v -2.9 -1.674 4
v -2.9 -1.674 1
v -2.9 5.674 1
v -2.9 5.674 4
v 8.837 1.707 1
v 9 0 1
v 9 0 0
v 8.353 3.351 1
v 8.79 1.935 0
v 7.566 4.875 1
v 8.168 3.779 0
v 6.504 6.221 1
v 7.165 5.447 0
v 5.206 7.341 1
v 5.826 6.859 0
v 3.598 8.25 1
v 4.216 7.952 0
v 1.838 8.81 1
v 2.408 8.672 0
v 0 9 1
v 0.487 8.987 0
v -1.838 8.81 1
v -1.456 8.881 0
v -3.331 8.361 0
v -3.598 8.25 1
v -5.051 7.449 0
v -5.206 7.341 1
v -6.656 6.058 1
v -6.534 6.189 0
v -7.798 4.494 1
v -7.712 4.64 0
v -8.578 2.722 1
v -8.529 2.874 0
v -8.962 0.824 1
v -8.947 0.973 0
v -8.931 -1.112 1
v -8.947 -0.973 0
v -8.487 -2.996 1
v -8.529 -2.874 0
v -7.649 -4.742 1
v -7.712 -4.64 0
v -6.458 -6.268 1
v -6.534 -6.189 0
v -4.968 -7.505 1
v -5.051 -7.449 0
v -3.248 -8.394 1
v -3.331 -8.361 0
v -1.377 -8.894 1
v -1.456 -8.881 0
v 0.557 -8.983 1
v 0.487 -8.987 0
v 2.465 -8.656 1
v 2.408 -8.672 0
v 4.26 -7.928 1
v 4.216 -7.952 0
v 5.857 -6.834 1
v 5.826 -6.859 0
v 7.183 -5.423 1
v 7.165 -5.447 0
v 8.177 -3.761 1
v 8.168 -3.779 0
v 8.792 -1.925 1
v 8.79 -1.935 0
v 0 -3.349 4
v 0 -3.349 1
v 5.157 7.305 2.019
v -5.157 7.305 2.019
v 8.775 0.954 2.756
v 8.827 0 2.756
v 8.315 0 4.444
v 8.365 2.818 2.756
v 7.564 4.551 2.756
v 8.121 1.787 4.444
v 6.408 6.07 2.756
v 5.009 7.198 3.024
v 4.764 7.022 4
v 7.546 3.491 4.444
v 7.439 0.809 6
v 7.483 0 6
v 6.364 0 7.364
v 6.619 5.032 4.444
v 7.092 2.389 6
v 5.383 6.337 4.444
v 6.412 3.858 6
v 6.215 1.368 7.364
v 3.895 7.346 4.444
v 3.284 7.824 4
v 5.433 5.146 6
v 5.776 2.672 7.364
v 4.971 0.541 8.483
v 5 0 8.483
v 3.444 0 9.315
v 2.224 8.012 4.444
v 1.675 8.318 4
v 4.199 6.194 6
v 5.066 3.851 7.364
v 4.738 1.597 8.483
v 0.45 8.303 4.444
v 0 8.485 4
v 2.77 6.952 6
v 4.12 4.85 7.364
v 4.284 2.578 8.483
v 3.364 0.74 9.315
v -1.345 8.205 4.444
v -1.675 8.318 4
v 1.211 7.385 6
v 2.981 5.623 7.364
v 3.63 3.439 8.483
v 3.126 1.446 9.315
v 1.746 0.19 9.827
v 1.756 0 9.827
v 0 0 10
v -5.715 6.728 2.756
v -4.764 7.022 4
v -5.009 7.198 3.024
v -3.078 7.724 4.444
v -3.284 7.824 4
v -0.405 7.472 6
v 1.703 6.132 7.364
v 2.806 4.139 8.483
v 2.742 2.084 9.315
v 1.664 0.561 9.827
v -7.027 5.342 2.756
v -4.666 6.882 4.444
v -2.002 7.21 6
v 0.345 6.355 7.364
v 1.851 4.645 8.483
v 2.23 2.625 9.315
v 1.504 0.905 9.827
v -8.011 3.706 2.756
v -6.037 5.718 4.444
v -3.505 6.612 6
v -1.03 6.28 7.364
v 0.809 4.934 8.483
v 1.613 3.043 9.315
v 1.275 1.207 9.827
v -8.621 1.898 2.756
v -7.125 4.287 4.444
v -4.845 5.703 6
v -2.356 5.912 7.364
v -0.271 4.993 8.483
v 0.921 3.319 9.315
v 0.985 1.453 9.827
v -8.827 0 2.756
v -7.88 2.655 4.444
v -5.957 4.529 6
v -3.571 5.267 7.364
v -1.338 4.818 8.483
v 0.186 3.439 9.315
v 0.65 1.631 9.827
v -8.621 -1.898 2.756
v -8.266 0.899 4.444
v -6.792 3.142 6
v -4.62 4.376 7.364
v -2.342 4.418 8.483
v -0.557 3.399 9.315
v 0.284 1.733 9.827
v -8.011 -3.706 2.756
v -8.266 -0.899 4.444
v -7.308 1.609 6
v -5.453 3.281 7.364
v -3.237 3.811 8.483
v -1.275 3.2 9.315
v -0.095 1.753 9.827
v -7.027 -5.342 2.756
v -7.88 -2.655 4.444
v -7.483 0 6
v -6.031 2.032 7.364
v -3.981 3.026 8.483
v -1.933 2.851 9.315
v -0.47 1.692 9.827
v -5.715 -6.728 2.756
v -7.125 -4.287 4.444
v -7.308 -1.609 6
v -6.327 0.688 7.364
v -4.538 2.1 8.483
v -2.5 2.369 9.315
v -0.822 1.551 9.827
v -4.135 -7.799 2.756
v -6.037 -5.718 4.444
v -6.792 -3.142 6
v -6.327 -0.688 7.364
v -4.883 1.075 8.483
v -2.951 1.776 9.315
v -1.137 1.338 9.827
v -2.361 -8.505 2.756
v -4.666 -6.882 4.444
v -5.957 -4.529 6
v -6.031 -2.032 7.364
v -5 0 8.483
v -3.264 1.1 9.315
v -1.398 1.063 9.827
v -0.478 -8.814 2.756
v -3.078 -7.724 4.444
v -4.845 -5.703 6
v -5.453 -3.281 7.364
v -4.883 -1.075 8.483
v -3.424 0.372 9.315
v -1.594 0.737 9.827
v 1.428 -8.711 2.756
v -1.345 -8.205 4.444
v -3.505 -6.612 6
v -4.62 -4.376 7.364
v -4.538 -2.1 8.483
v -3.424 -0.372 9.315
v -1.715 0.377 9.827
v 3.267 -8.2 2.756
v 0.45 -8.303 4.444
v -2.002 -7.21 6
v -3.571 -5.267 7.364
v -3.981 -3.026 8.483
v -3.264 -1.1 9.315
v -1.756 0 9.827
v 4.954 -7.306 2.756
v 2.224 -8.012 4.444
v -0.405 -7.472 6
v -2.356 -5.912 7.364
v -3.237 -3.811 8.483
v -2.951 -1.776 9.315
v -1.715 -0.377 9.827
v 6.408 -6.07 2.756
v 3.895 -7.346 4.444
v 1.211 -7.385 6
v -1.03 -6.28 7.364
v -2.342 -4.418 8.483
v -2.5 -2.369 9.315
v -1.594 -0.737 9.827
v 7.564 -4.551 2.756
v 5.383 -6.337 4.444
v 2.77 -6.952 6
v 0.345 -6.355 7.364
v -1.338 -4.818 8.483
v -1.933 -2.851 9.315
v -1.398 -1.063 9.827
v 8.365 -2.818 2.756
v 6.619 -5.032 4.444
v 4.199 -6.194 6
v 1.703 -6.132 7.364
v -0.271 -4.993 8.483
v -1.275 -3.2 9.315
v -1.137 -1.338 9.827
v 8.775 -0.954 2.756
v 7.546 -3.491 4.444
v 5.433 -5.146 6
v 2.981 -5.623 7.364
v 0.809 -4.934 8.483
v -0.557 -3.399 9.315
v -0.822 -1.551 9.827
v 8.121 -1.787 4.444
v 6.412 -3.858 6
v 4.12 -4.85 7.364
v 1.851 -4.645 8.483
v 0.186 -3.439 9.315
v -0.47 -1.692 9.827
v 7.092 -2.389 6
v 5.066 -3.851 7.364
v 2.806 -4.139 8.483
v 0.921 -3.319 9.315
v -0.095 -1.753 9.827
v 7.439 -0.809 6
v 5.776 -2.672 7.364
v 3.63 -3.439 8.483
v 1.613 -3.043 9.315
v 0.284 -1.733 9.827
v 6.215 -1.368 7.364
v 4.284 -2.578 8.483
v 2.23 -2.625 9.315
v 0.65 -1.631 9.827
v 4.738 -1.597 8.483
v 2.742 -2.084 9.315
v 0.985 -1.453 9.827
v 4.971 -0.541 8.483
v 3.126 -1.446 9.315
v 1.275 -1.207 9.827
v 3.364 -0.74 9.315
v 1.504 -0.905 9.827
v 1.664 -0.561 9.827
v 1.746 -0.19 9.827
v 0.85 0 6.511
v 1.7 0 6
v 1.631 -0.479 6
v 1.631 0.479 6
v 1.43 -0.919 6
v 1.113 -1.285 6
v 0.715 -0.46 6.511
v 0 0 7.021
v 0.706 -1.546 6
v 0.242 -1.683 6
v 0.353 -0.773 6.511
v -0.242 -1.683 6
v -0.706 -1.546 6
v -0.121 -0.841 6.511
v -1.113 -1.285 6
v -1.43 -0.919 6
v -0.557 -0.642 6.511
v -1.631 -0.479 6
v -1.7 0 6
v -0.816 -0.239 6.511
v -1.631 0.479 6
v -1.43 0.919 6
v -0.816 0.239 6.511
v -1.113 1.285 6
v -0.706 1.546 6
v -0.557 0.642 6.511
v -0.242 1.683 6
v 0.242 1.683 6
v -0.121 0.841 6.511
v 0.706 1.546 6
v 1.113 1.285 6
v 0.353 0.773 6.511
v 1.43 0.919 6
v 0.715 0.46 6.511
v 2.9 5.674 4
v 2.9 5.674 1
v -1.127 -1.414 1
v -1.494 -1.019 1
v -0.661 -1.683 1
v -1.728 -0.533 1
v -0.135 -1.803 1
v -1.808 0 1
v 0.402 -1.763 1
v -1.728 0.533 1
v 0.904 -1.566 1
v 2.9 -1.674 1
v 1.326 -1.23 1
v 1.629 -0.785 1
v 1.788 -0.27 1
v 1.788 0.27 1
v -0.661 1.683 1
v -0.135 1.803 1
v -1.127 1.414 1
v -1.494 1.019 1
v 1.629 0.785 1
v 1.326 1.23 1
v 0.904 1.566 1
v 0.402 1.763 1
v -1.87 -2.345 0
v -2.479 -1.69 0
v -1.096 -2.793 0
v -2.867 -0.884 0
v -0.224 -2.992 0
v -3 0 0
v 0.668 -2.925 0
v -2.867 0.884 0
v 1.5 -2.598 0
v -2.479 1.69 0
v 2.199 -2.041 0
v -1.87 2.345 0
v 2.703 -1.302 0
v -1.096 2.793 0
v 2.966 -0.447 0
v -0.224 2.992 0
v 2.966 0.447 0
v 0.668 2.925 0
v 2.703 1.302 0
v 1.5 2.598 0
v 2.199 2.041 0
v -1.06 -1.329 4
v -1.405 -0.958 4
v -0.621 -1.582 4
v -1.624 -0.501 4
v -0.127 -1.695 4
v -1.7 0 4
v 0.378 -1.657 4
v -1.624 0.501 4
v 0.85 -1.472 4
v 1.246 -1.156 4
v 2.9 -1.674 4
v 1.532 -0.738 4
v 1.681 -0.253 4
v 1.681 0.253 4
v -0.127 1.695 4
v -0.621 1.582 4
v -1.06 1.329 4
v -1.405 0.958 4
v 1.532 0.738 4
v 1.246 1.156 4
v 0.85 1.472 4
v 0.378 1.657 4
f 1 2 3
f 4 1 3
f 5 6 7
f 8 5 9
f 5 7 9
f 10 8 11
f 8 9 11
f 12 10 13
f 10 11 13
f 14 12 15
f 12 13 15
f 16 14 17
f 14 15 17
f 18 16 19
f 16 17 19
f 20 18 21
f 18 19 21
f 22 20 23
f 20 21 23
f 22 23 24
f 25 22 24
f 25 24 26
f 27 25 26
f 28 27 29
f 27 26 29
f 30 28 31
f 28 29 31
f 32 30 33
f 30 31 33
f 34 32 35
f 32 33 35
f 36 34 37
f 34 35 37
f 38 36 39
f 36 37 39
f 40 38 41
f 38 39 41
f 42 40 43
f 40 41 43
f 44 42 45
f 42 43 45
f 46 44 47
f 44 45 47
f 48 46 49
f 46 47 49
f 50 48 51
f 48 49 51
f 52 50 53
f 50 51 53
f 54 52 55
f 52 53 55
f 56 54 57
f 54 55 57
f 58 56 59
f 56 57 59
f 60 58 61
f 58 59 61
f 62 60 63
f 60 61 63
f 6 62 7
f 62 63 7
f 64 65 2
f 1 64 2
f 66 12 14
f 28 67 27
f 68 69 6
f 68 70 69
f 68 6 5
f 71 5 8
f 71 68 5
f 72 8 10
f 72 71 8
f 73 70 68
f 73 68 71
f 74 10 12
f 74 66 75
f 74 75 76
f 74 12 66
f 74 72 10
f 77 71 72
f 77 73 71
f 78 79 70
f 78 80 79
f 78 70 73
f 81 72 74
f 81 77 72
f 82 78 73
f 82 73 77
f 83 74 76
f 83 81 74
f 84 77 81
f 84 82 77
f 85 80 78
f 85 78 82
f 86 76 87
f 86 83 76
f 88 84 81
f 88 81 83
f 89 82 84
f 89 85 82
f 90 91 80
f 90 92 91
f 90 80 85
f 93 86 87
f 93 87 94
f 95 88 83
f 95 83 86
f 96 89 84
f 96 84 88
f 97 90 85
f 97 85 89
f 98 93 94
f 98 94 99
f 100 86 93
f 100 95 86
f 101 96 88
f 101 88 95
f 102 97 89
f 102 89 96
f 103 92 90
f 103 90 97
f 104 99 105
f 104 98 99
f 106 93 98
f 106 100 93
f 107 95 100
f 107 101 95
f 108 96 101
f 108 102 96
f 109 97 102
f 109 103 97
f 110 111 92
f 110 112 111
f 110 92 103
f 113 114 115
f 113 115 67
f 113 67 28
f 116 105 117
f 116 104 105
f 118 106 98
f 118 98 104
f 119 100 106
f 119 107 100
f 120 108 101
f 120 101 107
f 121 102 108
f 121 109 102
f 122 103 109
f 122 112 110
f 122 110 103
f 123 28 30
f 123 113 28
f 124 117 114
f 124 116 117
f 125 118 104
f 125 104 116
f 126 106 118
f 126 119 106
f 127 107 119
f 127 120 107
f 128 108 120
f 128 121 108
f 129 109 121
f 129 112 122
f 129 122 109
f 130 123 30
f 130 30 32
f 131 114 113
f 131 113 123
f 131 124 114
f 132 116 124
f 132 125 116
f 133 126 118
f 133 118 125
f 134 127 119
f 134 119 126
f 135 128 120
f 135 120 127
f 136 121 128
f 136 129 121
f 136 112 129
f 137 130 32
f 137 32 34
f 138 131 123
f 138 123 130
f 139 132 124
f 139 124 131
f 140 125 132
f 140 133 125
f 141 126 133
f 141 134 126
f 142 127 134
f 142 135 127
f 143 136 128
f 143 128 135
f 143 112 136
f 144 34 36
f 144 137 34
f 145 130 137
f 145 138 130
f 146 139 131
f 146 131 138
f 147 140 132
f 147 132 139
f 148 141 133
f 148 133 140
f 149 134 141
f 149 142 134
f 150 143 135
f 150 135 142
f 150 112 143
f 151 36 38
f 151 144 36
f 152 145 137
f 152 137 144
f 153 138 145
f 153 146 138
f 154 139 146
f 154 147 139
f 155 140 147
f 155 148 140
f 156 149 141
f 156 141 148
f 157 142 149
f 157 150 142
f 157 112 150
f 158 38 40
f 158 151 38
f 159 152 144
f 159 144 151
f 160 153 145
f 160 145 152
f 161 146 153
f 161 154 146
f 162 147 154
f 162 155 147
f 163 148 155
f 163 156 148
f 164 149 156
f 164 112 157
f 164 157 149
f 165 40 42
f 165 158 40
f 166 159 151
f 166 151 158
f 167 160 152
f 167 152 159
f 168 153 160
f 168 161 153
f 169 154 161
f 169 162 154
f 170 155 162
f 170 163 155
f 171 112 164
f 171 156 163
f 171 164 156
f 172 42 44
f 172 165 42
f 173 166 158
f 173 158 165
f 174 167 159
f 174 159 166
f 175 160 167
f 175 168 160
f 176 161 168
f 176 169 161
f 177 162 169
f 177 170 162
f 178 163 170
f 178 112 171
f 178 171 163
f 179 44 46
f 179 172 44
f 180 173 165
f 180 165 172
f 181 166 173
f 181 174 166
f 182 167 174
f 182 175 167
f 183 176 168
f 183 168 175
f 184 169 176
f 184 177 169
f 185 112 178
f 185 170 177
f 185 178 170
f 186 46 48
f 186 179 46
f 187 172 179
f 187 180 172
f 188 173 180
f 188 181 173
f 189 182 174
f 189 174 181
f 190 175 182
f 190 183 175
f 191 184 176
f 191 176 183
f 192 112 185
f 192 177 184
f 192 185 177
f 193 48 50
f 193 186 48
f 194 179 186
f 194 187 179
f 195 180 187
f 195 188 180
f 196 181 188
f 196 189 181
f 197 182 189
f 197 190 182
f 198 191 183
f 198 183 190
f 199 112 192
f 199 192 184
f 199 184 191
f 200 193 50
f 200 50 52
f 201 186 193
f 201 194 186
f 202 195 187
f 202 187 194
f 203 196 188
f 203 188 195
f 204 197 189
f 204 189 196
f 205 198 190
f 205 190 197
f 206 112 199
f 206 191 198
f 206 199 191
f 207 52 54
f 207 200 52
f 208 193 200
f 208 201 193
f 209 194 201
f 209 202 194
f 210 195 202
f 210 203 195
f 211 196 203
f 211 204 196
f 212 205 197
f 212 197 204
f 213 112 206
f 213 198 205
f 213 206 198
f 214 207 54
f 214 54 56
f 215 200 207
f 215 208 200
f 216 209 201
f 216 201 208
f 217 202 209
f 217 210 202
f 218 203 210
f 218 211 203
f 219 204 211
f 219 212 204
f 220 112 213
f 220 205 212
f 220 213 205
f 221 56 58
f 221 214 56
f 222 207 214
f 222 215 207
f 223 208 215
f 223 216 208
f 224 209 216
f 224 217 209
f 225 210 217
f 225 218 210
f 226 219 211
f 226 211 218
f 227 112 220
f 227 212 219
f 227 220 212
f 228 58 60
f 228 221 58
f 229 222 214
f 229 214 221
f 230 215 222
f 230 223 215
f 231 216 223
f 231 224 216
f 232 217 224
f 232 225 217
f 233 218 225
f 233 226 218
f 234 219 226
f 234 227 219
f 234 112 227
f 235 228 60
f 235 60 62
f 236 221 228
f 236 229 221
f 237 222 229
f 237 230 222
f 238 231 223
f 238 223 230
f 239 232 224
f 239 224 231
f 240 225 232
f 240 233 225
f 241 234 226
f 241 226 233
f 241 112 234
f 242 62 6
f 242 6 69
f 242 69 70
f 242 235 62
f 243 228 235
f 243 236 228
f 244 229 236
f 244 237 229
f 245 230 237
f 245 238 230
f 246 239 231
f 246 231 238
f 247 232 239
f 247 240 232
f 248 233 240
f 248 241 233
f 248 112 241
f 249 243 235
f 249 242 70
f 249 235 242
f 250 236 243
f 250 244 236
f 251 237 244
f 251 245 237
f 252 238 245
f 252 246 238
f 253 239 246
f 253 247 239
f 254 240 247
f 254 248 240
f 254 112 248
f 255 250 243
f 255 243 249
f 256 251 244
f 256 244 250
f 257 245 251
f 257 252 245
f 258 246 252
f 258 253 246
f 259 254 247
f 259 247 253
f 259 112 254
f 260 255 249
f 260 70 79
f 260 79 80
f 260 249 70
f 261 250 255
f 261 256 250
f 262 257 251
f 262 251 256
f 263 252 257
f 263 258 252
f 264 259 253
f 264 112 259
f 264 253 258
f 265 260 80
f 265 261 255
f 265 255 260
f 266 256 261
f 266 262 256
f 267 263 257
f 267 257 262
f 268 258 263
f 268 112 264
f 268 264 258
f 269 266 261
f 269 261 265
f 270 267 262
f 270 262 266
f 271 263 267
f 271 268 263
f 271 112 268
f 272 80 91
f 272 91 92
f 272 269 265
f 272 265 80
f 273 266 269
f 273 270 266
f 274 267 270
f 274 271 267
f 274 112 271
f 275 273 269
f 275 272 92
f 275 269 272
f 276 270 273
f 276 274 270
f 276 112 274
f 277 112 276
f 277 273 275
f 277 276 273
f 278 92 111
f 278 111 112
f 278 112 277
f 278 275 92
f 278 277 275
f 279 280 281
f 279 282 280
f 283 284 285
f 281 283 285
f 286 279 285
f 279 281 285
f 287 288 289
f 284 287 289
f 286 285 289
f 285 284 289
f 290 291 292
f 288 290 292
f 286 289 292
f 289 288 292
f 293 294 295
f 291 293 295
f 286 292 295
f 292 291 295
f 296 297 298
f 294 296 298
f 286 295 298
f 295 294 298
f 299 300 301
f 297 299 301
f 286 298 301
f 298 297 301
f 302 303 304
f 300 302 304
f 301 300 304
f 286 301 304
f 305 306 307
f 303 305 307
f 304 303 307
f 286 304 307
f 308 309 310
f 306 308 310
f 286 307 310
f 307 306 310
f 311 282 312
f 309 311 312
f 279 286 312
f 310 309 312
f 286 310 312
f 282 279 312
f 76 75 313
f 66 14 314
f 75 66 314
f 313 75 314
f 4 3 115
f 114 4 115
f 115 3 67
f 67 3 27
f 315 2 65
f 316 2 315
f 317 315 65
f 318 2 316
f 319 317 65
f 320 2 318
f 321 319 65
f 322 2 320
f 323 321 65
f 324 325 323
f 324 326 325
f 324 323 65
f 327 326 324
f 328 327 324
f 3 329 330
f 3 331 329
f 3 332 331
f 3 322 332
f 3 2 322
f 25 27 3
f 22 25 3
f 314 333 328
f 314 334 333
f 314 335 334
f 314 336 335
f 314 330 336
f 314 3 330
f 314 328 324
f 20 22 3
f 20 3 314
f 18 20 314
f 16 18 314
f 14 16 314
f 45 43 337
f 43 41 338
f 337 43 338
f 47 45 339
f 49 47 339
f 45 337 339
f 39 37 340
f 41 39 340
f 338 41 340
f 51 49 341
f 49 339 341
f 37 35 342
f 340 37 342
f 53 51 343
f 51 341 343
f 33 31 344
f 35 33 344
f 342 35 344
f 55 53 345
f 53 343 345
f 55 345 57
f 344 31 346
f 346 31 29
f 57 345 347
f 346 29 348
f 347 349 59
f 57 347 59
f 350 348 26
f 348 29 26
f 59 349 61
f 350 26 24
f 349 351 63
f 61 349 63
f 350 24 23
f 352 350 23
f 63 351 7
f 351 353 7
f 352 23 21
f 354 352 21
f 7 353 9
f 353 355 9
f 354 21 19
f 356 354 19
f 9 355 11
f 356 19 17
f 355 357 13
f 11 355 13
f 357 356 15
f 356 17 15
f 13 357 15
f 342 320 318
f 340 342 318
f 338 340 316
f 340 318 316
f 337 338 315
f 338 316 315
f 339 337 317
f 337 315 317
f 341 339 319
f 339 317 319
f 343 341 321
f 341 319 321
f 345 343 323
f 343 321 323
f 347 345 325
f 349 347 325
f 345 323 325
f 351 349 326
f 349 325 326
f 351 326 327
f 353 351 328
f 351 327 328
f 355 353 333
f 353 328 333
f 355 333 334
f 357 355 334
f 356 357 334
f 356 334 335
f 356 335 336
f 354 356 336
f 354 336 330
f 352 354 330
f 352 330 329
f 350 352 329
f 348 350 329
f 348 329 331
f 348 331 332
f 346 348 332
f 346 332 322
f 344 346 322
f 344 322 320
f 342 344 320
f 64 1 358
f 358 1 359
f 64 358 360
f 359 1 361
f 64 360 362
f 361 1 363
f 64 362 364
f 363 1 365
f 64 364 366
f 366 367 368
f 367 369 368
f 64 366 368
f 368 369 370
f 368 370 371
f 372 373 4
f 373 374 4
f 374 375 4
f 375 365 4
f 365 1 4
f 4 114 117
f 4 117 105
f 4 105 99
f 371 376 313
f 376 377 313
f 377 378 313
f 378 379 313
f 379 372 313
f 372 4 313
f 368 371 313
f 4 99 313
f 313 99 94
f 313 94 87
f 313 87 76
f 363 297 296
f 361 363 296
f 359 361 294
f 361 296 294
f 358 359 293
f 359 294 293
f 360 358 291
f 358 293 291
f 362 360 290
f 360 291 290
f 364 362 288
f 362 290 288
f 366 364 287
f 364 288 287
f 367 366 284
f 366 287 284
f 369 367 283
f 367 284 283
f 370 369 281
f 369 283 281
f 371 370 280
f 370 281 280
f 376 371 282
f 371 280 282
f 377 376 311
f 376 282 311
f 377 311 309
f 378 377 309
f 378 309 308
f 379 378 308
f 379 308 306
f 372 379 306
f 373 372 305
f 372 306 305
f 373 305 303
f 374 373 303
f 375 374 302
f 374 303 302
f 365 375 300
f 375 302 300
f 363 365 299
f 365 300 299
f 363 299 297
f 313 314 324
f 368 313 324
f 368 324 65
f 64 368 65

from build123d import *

# Parameters (mm, degrees)
F0_R           = 9
F1_DEPTH       = 1
F3_DEPTH       = 3
F4_R           = 9
F5_DEPTH       = 6
F7_D           = 3.4
F7_DEPTH       = 6
F7_CSINK_D     = 6
F7_CSINK_ANGLE = 100
F7_TIP         = 1.0214630523


# Not quite as in the source:
# - a fillet or chamfer that OpenCascade refuses, or shapes differently, is made with other operations: its cross-section is extruded or revolved along the edge and cut away or added


with BuildPart() as f1:
    # F0 (on Top) → F1 (new body)
    with BuildSketch(Plane.XY):
        Circle(F0_R)
    extrude(amount=F1_DEPTH)

    # F2 (on face) → F3 (join)
    with BuildSketch(Plane.XY.offset(1)):
        with BuildLine():
            Line((2.9, 5.6743157806), (2.9, 1.6743157806))
            Line((2.9, 1.6743157806), (2.9, -1.6743157806))
            Line((2.9, -1.6743157806), (0, -3.3486315613))
            Line((0, -3.3486315613), (-2.9, -1.6743157806))
            Line((-2.9, -1.6743157806), (-2.9, 1.6743157806))
            Line((-2.9, 1.6743157806), (-2.9, 5.6743157806))
            Line((-2.9, 5.6743157806), (-5.2062932022, 7.3412881086))
            ThreePointArc((-5.2062932022, 7.3412881086), (-4.1317890302, -7.995518708), (9, 0))
            ThreePointArc((9, 0), (7.995518708, 4.1317890302), (5.2062932022, 7.3412881086))
            Line((5.2062932022, 7.3412881086), (2.9, 5.6743157806))
        make_face()
    extrude(amount=F3_DEPTH)

    # F4 (on face) → F5 (join)
    with BuildSketch(Plane.XY.offset(4)):
        Circle(F4_R)
    extrude(amount=F5_DEPTH)

    # F6: fillet of radius 9 on 1 edges, made by hand

    # F6_s1 → F6_t2 (revolve, cut)
    with BuildSketch(Plane.XZ):
        with BuildLine():
            ThreePointArc((9, 1), (6.3639610307, 7.3639610307), (0, 10))
            Line((0, 10), (9, 10))
            Line((9, 10), (9, 1))
        make_face()
    revolve(axis=Axis((0, 0, 10), (0, 0, 1)), mode=Mode.SUBTRACT)

    # F7
    with Locations(Plane(origin=(0, 0, 0), x_dir=(1, 0, 0), z_dir=(0, 0, -1))):
        with Locations((0, 0)):
            CounterSinkHole(F7_D / 2, F7_CSINK_D / 2, depth=F7_DEPTH, counter_sink_angle=F7_CSINK_ANGLE)
            with Locations((0, 0, -(F7_DEPTH + F7_TIP / 2))):  # 118° drill point
                Cone(0, F7_D / 2, F7_TIP, mode=Mode.SUBTRACT)


solid = f1.part
